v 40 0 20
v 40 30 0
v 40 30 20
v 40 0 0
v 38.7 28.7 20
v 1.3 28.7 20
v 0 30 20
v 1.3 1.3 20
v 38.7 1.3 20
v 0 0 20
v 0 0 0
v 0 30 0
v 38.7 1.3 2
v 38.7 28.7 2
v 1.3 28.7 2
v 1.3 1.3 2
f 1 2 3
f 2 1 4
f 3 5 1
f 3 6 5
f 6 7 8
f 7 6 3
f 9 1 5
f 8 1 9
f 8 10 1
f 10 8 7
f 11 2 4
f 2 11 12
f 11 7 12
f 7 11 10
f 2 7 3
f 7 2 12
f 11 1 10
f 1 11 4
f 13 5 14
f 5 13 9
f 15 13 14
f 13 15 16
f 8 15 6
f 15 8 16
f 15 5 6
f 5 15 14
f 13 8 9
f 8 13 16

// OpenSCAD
$fn = 32;

// ----------------------------------------------------------------------
// Open box: 1.3 mm walls
// ----------------------------------------------------------------------

// --- parameters (mm) ---
box_l = 40;               // outer length, X
box_w = 30;               // outer width, Y
box_h = 20;               // outer height, Z
wall = 1.3;               // wall thickness
floor = 2;                // floor thickness

difference() {
  cube([box_l, box_w, box_h]);
  translate([wall, wall, floor])
    cube([box_l - 2 * wall, box_w - 2 * wall, box_h]);
}
